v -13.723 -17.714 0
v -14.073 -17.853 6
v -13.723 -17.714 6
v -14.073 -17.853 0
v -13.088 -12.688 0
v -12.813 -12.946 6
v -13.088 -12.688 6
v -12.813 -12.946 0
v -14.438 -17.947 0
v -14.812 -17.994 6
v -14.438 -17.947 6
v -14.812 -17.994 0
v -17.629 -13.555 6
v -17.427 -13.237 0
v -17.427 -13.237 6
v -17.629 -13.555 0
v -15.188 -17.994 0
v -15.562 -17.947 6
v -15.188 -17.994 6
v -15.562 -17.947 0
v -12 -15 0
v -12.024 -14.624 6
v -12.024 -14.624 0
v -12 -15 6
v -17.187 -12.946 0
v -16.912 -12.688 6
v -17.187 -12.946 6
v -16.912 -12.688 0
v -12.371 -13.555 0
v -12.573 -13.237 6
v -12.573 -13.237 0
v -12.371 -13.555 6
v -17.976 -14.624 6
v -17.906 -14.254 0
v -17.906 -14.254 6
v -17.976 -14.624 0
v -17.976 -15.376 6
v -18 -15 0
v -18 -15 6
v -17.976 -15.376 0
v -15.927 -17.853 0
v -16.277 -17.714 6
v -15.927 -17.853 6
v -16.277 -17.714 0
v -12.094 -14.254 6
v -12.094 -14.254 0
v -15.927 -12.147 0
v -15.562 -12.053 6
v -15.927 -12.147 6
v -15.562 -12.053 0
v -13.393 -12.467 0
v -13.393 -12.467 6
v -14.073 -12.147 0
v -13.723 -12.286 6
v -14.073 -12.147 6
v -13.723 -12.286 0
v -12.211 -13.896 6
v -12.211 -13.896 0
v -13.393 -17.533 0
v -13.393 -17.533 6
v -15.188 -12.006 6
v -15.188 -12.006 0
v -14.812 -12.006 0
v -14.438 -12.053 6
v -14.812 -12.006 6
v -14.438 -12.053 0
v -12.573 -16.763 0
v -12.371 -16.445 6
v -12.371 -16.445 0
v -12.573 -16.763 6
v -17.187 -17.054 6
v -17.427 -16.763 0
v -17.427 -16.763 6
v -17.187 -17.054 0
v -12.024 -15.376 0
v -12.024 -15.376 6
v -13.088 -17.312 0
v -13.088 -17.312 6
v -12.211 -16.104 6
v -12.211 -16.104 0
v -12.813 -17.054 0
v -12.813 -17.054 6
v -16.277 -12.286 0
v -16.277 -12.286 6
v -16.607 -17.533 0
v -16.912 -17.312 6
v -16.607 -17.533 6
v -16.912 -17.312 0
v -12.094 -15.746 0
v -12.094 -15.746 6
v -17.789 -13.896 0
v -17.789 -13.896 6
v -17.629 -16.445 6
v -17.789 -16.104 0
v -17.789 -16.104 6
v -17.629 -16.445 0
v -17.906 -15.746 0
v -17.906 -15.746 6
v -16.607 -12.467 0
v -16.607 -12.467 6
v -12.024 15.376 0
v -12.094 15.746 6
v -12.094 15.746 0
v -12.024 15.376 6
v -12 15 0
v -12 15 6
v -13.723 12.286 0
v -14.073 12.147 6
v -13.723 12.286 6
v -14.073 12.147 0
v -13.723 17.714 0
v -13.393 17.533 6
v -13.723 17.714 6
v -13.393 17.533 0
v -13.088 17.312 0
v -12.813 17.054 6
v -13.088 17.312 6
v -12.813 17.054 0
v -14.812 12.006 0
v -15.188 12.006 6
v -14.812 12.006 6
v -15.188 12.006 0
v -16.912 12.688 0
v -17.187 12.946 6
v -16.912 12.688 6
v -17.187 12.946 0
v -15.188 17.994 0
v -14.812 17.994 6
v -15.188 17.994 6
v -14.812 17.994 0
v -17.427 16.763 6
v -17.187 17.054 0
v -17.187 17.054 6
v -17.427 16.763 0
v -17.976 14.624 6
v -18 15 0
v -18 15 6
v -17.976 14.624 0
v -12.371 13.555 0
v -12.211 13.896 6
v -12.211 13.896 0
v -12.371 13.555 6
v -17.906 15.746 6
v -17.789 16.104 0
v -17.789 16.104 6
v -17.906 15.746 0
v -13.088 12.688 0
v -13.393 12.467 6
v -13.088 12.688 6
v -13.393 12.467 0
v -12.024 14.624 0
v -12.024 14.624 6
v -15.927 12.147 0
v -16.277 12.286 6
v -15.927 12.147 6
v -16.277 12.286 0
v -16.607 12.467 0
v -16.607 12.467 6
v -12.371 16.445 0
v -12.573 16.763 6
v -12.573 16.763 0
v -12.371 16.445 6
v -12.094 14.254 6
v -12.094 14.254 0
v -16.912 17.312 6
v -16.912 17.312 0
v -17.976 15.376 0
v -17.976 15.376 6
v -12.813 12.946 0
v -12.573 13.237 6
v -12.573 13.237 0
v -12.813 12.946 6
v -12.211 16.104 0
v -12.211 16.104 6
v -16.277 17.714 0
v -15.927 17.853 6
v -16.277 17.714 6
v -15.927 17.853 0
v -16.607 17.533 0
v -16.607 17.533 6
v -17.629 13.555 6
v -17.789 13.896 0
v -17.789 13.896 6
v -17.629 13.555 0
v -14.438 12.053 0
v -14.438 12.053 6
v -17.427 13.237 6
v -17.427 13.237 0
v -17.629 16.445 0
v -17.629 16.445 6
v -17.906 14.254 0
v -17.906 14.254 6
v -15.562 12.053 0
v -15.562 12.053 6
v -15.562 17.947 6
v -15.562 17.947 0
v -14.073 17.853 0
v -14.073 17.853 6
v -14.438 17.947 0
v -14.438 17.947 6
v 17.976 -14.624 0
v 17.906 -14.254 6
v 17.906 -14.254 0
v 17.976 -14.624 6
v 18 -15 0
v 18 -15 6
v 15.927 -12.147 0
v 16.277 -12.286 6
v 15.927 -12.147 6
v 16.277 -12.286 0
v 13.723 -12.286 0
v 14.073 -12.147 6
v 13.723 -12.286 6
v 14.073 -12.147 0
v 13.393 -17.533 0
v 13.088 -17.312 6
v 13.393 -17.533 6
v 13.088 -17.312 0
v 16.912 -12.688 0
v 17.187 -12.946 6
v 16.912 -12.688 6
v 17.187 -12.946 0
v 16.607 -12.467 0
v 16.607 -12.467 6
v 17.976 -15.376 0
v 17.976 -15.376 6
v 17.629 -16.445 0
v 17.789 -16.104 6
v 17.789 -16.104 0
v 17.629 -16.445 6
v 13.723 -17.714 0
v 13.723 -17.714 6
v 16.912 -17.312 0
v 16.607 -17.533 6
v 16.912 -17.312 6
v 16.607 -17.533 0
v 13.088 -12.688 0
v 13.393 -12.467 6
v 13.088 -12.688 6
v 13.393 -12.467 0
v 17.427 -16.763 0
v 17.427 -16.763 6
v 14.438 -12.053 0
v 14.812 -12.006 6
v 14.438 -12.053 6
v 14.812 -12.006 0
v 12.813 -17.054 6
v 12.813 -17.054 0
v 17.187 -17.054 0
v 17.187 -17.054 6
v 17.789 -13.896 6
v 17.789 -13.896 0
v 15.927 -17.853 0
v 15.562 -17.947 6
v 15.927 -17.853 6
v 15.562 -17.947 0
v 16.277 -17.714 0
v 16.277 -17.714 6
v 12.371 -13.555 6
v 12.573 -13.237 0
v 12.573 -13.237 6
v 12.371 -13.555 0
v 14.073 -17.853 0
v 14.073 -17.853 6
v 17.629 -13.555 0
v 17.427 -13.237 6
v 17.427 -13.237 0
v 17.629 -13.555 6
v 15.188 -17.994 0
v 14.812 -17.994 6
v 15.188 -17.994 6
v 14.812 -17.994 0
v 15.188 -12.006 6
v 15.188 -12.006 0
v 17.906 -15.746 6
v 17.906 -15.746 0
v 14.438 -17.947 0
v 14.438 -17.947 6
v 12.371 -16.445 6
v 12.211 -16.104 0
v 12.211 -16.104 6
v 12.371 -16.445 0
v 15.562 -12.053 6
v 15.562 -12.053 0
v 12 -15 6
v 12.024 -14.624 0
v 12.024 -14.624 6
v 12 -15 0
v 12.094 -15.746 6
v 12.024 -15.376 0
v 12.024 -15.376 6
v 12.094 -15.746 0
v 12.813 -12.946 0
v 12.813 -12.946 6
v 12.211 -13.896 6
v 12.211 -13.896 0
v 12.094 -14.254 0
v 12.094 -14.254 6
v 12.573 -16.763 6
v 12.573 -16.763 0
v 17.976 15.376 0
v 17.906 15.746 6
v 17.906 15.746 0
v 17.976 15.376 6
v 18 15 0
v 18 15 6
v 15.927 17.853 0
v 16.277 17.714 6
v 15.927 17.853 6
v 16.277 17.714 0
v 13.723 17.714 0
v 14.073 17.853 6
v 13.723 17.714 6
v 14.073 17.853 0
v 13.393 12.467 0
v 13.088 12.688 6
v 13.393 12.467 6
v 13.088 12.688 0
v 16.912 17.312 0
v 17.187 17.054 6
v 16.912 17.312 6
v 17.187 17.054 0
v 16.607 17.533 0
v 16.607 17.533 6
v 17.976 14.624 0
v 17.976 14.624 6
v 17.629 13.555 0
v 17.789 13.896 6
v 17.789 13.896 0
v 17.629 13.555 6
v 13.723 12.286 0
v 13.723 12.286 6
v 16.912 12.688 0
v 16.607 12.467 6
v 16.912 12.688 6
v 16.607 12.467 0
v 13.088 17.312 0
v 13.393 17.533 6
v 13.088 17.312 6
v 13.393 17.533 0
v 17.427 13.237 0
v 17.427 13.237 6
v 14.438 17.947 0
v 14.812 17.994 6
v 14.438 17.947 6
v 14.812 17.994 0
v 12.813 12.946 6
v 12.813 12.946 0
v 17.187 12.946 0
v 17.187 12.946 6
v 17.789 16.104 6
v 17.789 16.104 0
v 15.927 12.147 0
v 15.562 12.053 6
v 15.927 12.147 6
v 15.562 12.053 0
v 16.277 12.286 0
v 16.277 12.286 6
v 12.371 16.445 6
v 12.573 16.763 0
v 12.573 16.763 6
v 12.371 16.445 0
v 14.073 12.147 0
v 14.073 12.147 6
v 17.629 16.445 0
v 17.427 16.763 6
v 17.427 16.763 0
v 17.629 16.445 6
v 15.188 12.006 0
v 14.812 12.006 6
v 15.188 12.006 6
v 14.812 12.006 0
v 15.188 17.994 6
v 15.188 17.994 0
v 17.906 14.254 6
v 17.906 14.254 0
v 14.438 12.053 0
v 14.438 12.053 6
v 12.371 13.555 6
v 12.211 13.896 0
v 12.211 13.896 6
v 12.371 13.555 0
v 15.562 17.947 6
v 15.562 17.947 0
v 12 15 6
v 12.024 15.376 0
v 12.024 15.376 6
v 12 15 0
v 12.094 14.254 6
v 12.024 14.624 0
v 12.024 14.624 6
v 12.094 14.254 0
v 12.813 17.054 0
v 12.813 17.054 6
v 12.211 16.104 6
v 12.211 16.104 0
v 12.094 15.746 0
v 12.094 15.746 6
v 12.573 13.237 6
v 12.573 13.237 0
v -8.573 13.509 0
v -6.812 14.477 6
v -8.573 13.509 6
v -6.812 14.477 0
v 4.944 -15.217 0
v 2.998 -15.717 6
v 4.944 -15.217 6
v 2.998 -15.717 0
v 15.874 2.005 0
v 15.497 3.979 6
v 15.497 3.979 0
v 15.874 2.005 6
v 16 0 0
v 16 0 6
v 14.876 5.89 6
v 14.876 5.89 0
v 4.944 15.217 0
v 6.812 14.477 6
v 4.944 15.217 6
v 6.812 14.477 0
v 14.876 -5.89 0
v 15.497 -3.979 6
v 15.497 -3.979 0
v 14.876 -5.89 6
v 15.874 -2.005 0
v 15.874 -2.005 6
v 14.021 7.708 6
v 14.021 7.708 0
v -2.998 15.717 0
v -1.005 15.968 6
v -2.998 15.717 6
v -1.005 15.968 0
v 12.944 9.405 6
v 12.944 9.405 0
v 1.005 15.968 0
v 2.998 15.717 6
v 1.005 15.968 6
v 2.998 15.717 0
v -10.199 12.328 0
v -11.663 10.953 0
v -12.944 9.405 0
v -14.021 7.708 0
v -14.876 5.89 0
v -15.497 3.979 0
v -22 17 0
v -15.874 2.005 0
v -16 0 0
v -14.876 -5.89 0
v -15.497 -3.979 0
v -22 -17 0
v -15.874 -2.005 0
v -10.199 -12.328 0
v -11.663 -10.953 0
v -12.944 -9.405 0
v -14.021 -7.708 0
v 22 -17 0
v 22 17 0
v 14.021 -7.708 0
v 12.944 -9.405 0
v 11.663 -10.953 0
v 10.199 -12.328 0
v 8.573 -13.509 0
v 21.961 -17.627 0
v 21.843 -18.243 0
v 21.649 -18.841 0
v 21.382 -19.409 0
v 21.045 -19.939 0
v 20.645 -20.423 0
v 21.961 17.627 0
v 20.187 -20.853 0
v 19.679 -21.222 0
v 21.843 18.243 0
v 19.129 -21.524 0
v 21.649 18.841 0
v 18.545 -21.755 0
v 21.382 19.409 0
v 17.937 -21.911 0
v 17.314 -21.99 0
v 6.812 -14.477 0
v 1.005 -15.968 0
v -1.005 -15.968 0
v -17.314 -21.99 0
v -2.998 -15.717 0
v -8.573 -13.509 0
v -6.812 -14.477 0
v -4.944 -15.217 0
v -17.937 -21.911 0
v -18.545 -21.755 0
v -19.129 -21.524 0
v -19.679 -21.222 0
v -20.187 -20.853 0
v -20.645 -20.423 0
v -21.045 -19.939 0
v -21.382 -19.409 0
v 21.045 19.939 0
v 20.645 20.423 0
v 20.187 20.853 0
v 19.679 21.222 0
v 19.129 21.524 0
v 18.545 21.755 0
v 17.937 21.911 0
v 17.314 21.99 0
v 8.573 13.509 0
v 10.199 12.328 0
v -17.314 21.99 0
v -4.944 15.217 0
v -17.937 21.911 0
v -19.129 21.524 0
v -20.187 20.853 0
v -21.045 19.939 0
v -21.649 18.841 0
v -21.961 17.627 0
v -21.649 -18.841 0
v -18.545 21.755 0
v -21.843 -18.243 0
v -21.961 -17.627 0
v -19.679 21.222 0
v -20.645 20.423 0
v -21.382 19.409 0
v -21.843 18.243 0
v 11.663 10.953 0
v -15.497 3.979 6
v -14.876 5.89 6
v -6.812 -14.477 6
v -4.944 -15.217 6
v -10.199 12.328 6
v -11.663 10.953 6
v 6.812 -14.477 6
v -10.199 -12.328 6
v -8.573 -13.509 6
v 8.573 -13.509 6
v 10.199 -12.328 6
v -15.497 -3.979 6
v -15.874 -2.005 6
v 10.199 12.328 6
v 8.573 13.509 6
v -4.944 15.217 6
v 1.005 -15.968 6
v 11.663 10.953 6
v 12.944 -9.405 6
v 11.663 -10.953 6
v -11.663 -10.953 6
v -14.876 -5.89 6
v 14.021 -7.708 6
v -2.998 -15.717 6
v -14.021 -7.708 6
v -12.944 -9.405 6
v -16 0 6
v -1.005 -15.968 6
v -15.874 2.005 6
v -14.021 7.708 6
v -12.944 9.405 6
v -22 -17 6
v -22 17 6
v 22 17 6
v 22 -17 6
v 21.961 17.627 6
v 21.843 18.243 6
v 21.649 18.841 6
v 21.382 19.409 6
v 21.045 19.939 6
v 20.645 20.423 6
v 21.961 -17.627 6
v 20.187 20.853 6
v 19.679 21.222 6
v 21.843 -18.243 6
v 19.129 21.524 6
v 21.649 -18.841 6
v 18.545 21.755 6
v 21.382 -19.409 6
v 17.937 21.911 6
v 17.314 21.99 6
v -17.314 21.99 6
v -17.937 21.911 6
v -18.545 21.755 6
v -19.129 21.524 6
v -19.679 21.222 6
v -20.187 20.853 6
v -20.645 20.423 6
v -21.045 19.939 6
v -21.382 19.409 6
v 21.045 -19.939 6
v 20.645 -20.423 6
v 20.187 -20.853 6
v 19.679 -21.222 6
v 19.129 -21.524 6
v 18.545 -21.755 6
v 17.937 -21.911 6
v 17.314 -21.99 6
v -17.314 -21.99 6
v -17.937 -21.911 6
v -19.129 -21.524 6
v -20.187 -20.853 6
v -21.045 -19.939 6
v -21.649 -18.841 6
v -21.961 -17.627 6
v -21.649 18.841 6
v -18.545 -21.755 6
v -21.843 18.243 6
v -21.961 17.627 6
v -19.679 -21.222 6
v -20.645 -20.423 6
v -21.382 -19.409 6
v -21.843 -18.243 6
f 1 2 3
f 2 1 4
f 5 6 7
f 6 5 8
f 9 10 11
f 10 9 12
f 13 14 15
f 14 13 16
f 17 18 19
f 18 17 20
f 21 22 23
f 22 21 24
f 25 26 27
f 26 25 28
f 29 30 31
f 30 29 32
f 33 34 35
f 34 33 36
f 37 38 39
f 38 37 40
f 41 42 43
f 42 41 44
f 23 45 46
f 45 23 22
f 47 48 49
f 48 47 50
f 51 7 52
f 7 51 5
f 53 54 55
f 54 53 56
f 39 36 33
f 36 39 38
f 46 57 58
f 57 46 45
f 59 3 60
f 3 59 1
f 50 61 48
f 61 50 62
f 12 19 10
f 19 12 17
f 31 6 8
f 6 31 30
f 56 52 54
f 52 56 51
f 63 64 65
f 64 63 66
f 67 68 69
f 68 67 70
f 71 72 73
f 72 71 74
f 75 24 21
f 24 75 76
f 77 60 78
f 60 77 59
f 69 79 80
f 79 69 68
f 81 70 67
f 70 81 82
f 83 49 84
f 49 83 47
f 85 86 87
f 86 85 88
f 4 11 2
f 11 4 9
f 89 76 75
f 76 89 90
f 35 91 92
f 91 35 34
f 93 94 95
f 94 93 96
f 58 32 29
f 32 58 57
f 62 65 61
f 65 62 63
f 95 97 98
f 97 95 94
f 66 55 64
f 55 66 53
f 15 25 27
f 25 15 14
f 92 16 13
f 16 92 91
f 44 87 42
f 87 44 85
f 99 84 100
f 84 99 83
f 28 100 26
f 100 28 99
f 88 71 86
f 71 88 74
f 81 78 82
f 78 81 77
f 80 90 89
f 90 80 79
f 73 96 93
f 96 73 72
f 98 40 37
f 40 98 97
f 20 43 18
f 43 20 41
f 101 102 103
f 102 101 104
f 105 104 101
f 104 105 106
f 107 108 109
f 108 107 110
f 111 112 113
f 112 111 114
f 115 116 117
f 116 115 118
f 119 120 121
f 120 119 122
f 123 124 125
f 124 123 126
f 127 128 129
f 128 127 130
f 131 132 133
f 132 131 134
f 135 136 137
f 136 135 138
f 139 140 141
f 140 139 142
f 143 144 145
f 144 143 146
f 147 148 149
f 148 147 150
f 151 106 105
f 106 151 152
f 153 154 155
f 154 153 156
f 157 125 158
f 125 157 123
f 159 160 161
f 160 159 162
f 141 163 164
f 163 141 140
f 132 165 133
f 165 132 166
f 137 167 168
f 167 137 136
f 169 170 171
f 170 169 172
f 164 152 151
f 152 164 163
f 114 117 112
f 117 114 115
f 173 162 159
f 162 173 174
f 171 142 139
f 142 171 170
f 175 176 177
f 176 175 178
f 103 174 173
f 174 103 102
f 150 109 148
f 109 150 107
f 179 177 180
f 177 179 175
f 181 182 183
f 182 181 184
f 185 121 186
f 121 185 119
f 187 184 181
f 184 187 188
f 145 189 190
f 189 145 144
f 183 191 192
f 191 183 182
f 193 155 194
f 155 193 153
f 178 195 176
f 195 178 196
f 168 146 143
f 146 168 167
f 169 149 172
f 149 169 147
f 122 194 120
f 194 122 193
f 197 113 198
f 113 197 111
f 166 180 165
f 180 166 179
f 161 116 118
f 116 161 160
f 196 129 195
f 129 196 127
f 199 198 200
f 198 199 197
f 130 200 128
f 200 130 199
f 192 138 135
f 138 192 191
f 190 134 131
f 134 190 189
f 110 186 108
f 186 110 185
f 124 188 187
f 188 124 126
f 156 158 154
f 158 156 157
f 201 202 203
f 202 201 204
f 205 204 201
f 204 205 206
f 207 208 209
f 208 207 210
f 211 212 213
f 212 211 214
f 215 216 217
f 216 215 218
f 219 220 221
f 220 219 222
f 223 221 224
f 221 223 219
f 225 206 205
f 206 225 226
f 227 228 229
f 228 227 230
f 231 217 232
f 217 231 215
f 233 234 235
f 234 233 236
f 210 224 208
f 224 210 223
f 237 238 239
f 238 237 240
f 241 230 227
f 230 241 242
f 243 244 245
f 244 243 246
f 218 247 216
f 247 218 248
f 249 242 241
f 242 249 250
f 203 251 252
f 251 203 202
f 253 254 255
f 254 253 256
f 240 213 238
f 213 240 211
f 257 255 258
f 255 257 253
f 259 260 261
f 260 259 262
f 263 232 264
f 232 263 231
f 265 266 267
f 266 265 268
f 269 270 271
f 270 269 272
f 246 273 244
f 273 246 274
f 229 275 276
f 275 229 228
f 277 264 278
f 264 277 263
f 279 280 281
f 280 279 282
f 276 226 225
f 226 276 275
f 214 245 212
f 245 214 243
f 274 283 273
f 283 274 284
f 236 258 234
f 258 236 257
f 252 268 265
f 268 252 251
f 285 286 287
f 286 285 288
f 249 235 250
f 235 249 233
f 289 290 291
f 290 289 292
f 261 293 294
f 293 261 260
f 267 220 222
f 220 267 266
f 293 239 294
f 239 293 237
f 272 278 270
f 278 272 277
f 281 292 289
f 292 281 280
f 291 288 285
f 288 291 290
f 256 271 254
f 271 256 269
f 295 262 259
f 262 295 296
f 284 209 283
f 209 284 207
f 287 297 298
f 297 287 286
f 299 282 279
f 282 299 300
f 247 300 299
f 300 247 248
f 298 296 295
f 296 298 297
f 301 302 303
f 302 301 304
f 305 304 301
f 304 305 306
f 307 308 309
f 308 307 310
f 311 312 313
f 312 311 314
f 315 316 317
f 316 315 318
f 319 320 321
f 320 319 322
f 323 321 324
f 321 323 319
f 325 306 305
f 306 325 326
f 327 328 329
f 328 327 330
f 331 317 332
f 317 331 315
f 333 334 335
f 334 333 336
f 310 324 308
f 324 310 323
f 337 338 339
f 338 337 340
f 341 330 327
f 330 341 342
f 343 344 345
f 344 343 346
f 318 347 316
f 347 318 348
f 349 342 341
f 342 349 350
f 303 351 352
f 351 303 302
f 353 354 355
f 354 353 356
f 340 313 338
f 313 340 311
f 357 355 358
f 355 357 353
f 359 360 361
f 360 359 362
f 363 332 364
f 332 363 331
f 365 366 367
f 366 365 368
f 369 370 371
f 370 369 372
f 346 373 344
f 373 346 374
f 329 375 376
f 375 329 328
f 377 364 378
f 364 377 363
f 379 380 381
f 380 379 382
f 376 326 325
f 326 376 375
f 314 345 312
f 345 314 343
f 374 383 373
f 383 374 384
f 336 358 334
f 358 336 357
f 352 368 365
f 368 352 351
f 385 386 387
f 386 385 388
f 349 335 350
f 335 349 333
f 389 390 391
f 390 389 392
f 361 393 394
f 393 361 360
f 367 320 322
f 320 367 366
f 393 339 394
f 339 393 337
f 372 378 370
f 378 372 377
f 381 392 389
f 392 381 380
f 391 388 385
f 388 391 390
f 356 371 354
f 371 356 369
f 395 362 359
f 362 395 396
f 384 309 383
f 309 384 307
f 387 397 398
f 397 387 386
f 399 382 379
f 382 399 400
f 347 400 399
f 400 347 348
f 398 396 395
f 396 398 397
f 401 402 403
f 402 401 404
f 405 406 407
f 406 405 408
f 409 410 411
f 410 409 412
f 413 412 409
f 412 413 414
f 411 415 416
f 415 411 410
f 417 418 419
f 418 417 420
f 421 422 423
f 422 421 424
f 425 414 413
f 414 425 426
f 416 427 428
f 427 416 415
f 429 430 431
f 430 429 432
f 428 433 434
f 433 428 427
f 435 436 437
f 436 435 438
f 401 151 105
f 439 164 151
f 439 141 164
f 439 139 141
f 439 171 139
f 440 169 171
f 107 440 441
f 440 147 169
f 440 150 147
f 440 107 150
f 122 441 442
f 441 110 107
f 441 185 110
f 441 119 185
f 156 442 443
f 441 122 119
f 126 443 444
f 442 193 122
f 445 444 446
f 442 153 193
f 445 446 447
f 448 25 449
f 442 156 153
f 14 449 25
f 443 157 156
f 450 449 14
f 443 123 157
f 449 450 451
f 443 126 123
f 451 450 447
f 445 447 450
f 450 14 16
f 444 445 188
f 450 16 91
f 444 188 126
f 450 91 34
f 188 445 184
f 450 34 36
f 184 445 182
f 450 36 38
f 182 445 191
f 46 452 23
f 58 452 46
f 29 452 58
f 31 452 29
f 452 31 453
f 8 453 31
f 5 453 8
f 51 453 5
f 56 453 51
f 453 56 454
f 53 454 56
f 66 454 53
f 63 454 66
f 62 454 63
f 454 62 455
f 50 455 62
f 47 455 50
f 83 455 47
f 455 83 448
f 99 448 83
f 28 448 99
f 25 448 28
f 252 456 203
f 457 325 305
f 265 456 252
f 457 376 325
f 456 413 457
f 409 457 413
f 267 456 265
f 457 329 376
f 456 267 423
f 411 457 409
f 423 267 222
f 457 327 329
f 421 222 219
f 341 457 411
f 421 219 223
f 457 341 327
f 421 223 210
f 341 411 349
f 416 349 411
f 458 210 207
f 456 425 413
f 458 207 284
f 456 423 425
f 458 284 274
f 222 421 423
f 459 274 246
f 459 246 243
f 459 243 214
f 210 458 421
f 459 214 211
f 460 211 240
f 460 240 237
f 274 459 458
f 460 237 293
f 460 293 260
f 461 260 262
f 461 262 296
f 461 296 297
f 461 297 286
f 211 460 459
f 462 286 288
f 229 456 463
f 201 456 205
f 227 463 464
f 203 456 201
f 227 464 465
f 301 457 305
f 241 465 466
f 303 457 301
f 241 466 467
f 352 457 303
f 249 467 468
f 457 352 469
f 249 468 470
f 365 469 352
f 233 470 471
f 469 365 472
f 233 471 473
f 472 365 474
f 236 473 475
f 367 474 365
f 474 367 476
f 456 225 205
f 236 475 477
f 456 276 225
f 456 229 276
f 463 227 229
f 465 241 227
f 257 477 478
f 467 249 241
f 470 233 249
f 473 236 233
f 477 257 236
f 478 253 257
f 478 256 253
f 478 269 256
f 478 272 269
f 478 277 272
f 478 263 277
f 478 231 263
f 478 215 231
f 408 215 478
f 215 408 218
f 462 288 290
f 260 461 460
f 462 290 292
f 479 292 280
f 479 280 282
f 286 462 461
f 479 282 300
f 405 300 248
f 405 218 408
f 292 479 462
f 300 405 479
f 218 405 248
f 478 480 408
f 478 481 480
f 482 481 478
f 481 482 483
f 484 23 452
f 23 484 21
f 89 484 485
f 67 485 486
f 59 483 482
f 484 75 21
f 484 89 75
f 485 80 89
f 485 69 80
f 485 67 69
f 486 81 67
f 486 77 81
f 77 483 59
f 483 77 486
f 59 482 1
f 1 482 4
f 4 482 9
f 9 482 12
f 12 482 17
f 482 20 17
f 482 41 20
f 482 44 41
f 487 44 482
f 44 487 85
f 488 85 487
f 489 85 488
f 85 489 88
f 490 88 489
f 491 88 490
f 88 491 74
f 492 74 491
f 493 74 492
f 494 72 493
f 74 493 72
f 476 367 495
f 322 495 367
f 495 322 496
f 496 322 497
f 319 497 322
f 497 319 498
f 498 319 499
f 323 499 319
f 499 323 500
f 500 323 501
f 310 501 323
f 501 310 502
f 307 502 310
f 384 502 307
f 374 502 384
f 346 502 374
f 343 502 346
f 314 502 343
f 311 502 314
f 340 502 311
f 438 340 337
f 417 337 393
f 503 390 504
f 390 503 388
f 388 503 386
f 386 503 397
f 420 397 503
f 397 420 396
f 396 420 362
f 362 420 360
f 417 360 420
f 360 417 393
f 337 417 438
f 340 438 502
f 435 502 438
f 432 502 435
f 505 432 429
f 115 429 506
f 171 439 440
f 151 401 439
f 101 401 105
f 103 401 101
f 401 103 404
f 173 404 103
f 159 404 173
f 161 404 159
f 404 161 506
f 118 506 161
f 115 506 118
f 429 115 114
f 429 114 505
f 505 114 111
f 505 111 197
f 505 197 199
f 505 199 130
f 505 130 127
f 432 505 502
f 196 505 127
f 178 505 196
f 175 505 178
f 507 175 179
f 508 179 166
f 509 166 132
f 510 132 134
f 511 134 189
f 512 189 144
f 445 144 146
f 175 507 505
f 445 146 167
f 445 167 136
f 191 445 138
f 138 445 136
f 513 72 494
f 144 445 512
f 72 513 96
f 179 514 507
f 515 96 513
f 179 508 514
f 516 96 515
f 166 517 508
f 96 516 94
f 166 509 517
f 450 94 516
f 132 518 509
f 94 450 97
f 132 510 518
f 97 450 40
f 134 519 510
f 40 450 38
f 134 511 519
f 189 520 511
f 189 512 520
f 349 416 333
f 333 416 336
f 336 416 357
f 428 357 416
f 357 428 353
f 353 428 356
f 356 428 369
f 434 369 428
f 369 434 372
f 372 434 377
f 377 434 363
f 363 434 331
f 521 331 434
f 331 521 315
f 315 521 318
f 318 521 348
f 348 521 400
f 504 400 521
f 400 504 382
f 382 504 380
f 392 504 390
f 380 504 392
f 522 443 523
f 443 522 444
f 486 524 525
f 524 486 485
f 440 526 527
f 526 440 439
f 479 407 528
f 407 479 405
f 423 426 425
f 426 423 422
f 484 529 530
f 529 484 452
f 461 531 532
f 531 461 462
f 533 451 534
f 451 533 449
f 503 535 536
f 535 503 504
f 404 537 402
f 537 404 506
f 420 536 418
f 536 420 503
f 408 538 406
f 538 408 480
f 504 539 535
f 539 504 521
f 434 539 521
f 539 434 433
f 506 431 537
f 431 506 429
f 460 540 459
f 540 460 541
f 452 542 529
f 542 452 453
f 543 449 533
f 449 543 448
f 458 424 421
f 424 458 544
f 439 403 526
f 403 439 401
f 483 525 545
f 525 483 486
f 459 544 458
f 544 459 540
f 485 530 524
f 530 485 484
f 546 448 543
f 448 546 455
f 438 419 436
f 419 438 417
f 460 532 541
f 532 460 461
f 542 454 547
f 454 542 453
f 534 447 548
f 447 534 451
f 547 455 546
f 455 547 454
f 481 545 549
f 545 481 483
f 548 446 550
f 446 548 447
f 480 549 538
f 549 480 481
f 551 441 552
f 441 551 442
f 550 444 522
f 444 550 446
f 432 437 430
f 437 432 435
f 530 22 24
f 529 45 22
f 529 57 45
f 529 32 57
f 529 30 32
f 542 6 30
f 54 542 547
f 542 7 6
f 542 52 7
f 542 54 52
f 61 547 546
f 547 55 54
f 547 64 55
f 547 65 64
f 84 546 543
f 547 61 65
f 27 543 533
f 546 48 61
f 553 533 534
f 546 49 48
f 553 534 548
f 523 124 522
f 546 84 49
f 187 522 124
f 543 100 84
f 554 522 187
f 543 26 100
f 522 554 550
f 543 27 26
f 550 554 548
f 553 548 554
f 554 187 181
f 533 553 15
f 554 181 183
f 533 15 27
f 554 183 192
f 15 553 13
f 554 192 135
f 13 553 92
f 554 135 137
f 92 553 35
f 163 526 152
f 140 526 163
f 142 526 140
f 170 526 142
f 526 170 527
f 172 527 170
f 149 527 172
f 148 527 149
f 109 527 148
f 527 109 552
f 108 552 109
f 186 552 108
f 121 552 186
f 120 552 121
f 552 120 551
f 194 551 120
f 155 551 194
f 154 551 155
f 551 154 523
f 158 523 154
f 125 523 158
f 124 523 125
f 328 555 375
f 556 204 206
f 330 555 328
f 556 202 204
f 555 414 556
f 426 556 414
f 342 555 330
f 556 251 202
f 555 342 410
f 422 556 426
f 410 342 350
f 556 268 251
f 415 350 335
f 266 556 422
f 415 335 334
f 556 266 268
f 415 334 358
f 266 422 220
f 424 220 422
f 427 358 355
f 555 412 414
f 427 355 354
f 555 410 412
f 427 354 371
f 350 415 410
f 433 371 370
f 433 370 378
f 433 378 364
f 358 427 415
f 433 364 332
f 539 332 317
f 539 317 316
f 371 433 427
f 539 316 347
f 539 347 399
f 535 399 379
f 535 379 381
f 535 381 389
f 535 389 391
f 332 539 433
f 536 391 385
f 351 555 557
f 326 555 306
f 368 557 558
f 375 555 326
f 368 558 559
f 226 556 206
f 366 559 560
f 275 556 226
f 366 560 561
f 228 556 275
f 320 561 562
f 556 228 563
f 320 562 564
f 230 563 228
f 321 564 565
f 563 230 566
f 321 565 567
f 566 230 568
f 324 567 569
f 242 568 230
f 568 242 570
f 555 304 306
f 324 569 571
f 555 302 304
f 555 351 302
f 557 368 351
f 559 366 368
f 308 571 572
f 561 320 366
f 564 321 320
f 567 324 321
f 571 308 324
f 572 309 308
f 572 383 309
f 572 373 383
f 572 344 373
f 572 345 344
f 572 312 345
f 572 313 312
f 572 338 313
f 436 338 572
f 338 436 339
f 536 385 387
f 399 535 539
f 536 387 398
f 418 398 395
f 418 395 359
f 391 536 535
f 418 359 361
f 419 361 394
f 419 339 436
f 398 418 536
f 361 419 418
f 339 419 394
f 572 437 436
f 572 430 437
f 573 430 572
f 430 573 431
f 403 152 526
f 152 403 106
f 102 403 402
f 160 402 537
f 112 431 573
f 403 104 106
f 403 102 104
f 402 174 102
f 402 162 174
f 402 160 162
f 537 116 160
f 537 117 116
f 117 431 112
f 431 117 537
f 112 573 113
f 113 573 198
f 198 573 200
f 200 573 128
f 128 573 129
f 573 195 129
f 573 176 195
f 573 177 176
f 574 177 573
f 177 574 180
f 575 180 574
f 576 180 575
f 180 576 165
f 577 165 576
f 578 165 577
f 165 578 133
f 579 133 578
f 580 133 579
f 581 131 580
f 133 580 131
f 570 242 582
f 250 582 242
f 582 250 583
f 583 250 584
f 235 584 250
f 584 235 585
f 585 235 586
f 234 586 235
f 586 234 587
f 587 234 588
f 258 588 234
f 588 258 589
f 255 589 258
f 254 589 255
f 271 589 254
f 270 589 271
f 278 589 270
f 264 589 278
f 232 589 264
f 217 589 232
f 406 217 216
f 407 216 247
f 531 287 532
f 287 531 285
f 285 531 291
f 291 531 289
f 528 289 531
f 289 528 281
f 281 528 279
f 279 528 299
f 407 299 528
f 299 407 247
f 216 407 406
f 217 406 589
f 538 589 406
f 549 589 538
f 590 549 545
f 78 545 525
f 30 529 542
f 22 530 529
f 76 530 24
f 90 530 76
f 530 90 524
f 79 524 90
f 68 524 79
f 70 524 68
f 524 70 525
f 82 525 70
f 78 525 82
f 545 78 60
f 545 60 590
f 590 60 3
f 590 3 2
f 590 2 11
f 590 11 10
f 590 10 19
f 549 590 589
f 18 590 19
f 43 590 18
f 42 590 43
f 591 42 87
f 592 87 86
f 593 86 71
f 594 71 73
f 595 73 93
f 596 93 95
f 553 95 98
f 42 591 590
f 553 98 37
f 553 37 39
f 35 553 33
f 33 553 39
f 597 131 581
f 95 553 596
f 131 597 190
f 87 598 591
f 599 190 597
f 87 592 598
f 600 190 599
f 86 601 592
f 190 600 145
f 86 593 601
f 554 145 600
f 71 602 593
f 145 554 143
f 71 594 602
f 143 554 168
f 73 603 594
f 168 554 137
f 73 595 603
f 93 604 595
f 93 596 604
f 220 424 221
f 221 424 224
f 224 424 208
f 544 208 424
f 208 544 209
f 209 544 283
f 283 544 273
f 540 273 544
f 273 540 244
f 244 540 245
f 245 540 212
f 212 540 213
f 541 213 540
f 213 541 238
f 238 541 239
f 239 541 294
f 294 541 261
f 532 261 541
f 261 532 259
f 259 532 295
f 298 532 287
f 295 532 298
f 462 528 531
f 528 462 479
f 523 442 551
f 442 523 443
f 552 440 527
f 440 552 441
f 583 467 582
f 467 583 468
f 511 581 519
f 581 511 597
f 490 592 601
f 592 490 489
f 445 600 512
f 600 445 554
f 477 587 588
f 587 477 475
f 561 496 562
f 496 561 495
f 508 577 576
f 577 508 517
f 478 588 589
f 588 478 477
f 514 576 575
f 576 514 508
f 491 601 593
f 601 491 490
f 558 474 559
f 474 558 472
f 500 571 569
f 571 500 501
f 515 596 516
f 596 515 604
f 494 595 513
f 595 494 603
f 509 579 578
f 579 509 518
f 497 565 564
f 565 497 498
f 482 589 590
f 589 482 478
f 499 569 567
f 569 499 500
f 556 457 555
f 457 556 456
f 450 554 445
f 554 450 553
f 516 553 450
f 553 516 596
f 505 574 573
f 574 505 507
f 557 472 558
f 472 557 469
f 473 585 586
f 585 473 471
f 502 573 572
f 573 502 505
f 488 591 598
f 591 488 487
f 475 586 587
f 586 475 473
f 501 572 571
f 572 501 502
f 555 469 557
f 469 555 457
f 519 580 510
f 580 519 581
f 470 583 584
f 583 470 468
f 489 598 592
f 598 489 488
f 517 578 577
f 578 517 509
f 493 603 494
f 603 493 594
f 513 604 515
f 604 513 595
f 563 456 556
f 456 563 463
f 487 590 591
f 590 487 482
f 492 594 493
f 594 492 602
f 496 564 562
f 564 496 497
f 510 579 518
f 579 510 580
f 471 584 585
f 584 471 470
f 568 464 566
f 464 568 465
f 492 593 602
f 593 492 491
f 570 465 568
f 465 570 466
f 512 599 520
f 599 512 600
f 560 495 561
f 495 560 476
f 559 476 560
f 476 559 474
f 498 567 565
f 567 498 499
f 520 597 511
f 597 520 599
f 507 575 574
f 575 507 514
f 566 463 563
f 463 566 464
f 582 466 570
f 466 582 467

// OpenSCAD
$fn = 50;


difference() {
	union() {
		hull() {
			translate(v = [-17.0000000000, 17.0000000000, 0]) {
				cylinder(h = 6, r = 5);
			}
			translate(v = [17.0000000000, 17.0000000000, 0]) {
				cylinder(h = 6, r = 5);
			}
			translate(v = [-17.0000000000, -17.0000000000, 0]) {
				cylinder(h = 6, r = 5);
			}
			translate(v = [17.0000000000, -17.0000000000, 0]) {
				cylinder(h = 6, r = 5);
			}
		}
	}
	union() {
		#translate(v = [-15.0000000000, -15.0000000000, -100.0000000000]) {
			cylinder(h = 200, r = 3.0000000000);
		}
		#translate(v = [-15.0000000000, 15.0000000000, -100.0000000000]) {
			cylinder(h = 200, r = 3.0000000000);
		}
		#translate(v = [15.0000000000, -15.0000000000, -100.0000000000]) {
			cylinder(h = 200, r = 3.0000000000);
		}
		#translate(v = [15.0000000000, 15.0000000000, -100.0000000000]) {
			cylinder(h = 200, r = 3.0000000000);
		}
		#cylinder(h = 6, r = 16.0000000000);
	}
}
